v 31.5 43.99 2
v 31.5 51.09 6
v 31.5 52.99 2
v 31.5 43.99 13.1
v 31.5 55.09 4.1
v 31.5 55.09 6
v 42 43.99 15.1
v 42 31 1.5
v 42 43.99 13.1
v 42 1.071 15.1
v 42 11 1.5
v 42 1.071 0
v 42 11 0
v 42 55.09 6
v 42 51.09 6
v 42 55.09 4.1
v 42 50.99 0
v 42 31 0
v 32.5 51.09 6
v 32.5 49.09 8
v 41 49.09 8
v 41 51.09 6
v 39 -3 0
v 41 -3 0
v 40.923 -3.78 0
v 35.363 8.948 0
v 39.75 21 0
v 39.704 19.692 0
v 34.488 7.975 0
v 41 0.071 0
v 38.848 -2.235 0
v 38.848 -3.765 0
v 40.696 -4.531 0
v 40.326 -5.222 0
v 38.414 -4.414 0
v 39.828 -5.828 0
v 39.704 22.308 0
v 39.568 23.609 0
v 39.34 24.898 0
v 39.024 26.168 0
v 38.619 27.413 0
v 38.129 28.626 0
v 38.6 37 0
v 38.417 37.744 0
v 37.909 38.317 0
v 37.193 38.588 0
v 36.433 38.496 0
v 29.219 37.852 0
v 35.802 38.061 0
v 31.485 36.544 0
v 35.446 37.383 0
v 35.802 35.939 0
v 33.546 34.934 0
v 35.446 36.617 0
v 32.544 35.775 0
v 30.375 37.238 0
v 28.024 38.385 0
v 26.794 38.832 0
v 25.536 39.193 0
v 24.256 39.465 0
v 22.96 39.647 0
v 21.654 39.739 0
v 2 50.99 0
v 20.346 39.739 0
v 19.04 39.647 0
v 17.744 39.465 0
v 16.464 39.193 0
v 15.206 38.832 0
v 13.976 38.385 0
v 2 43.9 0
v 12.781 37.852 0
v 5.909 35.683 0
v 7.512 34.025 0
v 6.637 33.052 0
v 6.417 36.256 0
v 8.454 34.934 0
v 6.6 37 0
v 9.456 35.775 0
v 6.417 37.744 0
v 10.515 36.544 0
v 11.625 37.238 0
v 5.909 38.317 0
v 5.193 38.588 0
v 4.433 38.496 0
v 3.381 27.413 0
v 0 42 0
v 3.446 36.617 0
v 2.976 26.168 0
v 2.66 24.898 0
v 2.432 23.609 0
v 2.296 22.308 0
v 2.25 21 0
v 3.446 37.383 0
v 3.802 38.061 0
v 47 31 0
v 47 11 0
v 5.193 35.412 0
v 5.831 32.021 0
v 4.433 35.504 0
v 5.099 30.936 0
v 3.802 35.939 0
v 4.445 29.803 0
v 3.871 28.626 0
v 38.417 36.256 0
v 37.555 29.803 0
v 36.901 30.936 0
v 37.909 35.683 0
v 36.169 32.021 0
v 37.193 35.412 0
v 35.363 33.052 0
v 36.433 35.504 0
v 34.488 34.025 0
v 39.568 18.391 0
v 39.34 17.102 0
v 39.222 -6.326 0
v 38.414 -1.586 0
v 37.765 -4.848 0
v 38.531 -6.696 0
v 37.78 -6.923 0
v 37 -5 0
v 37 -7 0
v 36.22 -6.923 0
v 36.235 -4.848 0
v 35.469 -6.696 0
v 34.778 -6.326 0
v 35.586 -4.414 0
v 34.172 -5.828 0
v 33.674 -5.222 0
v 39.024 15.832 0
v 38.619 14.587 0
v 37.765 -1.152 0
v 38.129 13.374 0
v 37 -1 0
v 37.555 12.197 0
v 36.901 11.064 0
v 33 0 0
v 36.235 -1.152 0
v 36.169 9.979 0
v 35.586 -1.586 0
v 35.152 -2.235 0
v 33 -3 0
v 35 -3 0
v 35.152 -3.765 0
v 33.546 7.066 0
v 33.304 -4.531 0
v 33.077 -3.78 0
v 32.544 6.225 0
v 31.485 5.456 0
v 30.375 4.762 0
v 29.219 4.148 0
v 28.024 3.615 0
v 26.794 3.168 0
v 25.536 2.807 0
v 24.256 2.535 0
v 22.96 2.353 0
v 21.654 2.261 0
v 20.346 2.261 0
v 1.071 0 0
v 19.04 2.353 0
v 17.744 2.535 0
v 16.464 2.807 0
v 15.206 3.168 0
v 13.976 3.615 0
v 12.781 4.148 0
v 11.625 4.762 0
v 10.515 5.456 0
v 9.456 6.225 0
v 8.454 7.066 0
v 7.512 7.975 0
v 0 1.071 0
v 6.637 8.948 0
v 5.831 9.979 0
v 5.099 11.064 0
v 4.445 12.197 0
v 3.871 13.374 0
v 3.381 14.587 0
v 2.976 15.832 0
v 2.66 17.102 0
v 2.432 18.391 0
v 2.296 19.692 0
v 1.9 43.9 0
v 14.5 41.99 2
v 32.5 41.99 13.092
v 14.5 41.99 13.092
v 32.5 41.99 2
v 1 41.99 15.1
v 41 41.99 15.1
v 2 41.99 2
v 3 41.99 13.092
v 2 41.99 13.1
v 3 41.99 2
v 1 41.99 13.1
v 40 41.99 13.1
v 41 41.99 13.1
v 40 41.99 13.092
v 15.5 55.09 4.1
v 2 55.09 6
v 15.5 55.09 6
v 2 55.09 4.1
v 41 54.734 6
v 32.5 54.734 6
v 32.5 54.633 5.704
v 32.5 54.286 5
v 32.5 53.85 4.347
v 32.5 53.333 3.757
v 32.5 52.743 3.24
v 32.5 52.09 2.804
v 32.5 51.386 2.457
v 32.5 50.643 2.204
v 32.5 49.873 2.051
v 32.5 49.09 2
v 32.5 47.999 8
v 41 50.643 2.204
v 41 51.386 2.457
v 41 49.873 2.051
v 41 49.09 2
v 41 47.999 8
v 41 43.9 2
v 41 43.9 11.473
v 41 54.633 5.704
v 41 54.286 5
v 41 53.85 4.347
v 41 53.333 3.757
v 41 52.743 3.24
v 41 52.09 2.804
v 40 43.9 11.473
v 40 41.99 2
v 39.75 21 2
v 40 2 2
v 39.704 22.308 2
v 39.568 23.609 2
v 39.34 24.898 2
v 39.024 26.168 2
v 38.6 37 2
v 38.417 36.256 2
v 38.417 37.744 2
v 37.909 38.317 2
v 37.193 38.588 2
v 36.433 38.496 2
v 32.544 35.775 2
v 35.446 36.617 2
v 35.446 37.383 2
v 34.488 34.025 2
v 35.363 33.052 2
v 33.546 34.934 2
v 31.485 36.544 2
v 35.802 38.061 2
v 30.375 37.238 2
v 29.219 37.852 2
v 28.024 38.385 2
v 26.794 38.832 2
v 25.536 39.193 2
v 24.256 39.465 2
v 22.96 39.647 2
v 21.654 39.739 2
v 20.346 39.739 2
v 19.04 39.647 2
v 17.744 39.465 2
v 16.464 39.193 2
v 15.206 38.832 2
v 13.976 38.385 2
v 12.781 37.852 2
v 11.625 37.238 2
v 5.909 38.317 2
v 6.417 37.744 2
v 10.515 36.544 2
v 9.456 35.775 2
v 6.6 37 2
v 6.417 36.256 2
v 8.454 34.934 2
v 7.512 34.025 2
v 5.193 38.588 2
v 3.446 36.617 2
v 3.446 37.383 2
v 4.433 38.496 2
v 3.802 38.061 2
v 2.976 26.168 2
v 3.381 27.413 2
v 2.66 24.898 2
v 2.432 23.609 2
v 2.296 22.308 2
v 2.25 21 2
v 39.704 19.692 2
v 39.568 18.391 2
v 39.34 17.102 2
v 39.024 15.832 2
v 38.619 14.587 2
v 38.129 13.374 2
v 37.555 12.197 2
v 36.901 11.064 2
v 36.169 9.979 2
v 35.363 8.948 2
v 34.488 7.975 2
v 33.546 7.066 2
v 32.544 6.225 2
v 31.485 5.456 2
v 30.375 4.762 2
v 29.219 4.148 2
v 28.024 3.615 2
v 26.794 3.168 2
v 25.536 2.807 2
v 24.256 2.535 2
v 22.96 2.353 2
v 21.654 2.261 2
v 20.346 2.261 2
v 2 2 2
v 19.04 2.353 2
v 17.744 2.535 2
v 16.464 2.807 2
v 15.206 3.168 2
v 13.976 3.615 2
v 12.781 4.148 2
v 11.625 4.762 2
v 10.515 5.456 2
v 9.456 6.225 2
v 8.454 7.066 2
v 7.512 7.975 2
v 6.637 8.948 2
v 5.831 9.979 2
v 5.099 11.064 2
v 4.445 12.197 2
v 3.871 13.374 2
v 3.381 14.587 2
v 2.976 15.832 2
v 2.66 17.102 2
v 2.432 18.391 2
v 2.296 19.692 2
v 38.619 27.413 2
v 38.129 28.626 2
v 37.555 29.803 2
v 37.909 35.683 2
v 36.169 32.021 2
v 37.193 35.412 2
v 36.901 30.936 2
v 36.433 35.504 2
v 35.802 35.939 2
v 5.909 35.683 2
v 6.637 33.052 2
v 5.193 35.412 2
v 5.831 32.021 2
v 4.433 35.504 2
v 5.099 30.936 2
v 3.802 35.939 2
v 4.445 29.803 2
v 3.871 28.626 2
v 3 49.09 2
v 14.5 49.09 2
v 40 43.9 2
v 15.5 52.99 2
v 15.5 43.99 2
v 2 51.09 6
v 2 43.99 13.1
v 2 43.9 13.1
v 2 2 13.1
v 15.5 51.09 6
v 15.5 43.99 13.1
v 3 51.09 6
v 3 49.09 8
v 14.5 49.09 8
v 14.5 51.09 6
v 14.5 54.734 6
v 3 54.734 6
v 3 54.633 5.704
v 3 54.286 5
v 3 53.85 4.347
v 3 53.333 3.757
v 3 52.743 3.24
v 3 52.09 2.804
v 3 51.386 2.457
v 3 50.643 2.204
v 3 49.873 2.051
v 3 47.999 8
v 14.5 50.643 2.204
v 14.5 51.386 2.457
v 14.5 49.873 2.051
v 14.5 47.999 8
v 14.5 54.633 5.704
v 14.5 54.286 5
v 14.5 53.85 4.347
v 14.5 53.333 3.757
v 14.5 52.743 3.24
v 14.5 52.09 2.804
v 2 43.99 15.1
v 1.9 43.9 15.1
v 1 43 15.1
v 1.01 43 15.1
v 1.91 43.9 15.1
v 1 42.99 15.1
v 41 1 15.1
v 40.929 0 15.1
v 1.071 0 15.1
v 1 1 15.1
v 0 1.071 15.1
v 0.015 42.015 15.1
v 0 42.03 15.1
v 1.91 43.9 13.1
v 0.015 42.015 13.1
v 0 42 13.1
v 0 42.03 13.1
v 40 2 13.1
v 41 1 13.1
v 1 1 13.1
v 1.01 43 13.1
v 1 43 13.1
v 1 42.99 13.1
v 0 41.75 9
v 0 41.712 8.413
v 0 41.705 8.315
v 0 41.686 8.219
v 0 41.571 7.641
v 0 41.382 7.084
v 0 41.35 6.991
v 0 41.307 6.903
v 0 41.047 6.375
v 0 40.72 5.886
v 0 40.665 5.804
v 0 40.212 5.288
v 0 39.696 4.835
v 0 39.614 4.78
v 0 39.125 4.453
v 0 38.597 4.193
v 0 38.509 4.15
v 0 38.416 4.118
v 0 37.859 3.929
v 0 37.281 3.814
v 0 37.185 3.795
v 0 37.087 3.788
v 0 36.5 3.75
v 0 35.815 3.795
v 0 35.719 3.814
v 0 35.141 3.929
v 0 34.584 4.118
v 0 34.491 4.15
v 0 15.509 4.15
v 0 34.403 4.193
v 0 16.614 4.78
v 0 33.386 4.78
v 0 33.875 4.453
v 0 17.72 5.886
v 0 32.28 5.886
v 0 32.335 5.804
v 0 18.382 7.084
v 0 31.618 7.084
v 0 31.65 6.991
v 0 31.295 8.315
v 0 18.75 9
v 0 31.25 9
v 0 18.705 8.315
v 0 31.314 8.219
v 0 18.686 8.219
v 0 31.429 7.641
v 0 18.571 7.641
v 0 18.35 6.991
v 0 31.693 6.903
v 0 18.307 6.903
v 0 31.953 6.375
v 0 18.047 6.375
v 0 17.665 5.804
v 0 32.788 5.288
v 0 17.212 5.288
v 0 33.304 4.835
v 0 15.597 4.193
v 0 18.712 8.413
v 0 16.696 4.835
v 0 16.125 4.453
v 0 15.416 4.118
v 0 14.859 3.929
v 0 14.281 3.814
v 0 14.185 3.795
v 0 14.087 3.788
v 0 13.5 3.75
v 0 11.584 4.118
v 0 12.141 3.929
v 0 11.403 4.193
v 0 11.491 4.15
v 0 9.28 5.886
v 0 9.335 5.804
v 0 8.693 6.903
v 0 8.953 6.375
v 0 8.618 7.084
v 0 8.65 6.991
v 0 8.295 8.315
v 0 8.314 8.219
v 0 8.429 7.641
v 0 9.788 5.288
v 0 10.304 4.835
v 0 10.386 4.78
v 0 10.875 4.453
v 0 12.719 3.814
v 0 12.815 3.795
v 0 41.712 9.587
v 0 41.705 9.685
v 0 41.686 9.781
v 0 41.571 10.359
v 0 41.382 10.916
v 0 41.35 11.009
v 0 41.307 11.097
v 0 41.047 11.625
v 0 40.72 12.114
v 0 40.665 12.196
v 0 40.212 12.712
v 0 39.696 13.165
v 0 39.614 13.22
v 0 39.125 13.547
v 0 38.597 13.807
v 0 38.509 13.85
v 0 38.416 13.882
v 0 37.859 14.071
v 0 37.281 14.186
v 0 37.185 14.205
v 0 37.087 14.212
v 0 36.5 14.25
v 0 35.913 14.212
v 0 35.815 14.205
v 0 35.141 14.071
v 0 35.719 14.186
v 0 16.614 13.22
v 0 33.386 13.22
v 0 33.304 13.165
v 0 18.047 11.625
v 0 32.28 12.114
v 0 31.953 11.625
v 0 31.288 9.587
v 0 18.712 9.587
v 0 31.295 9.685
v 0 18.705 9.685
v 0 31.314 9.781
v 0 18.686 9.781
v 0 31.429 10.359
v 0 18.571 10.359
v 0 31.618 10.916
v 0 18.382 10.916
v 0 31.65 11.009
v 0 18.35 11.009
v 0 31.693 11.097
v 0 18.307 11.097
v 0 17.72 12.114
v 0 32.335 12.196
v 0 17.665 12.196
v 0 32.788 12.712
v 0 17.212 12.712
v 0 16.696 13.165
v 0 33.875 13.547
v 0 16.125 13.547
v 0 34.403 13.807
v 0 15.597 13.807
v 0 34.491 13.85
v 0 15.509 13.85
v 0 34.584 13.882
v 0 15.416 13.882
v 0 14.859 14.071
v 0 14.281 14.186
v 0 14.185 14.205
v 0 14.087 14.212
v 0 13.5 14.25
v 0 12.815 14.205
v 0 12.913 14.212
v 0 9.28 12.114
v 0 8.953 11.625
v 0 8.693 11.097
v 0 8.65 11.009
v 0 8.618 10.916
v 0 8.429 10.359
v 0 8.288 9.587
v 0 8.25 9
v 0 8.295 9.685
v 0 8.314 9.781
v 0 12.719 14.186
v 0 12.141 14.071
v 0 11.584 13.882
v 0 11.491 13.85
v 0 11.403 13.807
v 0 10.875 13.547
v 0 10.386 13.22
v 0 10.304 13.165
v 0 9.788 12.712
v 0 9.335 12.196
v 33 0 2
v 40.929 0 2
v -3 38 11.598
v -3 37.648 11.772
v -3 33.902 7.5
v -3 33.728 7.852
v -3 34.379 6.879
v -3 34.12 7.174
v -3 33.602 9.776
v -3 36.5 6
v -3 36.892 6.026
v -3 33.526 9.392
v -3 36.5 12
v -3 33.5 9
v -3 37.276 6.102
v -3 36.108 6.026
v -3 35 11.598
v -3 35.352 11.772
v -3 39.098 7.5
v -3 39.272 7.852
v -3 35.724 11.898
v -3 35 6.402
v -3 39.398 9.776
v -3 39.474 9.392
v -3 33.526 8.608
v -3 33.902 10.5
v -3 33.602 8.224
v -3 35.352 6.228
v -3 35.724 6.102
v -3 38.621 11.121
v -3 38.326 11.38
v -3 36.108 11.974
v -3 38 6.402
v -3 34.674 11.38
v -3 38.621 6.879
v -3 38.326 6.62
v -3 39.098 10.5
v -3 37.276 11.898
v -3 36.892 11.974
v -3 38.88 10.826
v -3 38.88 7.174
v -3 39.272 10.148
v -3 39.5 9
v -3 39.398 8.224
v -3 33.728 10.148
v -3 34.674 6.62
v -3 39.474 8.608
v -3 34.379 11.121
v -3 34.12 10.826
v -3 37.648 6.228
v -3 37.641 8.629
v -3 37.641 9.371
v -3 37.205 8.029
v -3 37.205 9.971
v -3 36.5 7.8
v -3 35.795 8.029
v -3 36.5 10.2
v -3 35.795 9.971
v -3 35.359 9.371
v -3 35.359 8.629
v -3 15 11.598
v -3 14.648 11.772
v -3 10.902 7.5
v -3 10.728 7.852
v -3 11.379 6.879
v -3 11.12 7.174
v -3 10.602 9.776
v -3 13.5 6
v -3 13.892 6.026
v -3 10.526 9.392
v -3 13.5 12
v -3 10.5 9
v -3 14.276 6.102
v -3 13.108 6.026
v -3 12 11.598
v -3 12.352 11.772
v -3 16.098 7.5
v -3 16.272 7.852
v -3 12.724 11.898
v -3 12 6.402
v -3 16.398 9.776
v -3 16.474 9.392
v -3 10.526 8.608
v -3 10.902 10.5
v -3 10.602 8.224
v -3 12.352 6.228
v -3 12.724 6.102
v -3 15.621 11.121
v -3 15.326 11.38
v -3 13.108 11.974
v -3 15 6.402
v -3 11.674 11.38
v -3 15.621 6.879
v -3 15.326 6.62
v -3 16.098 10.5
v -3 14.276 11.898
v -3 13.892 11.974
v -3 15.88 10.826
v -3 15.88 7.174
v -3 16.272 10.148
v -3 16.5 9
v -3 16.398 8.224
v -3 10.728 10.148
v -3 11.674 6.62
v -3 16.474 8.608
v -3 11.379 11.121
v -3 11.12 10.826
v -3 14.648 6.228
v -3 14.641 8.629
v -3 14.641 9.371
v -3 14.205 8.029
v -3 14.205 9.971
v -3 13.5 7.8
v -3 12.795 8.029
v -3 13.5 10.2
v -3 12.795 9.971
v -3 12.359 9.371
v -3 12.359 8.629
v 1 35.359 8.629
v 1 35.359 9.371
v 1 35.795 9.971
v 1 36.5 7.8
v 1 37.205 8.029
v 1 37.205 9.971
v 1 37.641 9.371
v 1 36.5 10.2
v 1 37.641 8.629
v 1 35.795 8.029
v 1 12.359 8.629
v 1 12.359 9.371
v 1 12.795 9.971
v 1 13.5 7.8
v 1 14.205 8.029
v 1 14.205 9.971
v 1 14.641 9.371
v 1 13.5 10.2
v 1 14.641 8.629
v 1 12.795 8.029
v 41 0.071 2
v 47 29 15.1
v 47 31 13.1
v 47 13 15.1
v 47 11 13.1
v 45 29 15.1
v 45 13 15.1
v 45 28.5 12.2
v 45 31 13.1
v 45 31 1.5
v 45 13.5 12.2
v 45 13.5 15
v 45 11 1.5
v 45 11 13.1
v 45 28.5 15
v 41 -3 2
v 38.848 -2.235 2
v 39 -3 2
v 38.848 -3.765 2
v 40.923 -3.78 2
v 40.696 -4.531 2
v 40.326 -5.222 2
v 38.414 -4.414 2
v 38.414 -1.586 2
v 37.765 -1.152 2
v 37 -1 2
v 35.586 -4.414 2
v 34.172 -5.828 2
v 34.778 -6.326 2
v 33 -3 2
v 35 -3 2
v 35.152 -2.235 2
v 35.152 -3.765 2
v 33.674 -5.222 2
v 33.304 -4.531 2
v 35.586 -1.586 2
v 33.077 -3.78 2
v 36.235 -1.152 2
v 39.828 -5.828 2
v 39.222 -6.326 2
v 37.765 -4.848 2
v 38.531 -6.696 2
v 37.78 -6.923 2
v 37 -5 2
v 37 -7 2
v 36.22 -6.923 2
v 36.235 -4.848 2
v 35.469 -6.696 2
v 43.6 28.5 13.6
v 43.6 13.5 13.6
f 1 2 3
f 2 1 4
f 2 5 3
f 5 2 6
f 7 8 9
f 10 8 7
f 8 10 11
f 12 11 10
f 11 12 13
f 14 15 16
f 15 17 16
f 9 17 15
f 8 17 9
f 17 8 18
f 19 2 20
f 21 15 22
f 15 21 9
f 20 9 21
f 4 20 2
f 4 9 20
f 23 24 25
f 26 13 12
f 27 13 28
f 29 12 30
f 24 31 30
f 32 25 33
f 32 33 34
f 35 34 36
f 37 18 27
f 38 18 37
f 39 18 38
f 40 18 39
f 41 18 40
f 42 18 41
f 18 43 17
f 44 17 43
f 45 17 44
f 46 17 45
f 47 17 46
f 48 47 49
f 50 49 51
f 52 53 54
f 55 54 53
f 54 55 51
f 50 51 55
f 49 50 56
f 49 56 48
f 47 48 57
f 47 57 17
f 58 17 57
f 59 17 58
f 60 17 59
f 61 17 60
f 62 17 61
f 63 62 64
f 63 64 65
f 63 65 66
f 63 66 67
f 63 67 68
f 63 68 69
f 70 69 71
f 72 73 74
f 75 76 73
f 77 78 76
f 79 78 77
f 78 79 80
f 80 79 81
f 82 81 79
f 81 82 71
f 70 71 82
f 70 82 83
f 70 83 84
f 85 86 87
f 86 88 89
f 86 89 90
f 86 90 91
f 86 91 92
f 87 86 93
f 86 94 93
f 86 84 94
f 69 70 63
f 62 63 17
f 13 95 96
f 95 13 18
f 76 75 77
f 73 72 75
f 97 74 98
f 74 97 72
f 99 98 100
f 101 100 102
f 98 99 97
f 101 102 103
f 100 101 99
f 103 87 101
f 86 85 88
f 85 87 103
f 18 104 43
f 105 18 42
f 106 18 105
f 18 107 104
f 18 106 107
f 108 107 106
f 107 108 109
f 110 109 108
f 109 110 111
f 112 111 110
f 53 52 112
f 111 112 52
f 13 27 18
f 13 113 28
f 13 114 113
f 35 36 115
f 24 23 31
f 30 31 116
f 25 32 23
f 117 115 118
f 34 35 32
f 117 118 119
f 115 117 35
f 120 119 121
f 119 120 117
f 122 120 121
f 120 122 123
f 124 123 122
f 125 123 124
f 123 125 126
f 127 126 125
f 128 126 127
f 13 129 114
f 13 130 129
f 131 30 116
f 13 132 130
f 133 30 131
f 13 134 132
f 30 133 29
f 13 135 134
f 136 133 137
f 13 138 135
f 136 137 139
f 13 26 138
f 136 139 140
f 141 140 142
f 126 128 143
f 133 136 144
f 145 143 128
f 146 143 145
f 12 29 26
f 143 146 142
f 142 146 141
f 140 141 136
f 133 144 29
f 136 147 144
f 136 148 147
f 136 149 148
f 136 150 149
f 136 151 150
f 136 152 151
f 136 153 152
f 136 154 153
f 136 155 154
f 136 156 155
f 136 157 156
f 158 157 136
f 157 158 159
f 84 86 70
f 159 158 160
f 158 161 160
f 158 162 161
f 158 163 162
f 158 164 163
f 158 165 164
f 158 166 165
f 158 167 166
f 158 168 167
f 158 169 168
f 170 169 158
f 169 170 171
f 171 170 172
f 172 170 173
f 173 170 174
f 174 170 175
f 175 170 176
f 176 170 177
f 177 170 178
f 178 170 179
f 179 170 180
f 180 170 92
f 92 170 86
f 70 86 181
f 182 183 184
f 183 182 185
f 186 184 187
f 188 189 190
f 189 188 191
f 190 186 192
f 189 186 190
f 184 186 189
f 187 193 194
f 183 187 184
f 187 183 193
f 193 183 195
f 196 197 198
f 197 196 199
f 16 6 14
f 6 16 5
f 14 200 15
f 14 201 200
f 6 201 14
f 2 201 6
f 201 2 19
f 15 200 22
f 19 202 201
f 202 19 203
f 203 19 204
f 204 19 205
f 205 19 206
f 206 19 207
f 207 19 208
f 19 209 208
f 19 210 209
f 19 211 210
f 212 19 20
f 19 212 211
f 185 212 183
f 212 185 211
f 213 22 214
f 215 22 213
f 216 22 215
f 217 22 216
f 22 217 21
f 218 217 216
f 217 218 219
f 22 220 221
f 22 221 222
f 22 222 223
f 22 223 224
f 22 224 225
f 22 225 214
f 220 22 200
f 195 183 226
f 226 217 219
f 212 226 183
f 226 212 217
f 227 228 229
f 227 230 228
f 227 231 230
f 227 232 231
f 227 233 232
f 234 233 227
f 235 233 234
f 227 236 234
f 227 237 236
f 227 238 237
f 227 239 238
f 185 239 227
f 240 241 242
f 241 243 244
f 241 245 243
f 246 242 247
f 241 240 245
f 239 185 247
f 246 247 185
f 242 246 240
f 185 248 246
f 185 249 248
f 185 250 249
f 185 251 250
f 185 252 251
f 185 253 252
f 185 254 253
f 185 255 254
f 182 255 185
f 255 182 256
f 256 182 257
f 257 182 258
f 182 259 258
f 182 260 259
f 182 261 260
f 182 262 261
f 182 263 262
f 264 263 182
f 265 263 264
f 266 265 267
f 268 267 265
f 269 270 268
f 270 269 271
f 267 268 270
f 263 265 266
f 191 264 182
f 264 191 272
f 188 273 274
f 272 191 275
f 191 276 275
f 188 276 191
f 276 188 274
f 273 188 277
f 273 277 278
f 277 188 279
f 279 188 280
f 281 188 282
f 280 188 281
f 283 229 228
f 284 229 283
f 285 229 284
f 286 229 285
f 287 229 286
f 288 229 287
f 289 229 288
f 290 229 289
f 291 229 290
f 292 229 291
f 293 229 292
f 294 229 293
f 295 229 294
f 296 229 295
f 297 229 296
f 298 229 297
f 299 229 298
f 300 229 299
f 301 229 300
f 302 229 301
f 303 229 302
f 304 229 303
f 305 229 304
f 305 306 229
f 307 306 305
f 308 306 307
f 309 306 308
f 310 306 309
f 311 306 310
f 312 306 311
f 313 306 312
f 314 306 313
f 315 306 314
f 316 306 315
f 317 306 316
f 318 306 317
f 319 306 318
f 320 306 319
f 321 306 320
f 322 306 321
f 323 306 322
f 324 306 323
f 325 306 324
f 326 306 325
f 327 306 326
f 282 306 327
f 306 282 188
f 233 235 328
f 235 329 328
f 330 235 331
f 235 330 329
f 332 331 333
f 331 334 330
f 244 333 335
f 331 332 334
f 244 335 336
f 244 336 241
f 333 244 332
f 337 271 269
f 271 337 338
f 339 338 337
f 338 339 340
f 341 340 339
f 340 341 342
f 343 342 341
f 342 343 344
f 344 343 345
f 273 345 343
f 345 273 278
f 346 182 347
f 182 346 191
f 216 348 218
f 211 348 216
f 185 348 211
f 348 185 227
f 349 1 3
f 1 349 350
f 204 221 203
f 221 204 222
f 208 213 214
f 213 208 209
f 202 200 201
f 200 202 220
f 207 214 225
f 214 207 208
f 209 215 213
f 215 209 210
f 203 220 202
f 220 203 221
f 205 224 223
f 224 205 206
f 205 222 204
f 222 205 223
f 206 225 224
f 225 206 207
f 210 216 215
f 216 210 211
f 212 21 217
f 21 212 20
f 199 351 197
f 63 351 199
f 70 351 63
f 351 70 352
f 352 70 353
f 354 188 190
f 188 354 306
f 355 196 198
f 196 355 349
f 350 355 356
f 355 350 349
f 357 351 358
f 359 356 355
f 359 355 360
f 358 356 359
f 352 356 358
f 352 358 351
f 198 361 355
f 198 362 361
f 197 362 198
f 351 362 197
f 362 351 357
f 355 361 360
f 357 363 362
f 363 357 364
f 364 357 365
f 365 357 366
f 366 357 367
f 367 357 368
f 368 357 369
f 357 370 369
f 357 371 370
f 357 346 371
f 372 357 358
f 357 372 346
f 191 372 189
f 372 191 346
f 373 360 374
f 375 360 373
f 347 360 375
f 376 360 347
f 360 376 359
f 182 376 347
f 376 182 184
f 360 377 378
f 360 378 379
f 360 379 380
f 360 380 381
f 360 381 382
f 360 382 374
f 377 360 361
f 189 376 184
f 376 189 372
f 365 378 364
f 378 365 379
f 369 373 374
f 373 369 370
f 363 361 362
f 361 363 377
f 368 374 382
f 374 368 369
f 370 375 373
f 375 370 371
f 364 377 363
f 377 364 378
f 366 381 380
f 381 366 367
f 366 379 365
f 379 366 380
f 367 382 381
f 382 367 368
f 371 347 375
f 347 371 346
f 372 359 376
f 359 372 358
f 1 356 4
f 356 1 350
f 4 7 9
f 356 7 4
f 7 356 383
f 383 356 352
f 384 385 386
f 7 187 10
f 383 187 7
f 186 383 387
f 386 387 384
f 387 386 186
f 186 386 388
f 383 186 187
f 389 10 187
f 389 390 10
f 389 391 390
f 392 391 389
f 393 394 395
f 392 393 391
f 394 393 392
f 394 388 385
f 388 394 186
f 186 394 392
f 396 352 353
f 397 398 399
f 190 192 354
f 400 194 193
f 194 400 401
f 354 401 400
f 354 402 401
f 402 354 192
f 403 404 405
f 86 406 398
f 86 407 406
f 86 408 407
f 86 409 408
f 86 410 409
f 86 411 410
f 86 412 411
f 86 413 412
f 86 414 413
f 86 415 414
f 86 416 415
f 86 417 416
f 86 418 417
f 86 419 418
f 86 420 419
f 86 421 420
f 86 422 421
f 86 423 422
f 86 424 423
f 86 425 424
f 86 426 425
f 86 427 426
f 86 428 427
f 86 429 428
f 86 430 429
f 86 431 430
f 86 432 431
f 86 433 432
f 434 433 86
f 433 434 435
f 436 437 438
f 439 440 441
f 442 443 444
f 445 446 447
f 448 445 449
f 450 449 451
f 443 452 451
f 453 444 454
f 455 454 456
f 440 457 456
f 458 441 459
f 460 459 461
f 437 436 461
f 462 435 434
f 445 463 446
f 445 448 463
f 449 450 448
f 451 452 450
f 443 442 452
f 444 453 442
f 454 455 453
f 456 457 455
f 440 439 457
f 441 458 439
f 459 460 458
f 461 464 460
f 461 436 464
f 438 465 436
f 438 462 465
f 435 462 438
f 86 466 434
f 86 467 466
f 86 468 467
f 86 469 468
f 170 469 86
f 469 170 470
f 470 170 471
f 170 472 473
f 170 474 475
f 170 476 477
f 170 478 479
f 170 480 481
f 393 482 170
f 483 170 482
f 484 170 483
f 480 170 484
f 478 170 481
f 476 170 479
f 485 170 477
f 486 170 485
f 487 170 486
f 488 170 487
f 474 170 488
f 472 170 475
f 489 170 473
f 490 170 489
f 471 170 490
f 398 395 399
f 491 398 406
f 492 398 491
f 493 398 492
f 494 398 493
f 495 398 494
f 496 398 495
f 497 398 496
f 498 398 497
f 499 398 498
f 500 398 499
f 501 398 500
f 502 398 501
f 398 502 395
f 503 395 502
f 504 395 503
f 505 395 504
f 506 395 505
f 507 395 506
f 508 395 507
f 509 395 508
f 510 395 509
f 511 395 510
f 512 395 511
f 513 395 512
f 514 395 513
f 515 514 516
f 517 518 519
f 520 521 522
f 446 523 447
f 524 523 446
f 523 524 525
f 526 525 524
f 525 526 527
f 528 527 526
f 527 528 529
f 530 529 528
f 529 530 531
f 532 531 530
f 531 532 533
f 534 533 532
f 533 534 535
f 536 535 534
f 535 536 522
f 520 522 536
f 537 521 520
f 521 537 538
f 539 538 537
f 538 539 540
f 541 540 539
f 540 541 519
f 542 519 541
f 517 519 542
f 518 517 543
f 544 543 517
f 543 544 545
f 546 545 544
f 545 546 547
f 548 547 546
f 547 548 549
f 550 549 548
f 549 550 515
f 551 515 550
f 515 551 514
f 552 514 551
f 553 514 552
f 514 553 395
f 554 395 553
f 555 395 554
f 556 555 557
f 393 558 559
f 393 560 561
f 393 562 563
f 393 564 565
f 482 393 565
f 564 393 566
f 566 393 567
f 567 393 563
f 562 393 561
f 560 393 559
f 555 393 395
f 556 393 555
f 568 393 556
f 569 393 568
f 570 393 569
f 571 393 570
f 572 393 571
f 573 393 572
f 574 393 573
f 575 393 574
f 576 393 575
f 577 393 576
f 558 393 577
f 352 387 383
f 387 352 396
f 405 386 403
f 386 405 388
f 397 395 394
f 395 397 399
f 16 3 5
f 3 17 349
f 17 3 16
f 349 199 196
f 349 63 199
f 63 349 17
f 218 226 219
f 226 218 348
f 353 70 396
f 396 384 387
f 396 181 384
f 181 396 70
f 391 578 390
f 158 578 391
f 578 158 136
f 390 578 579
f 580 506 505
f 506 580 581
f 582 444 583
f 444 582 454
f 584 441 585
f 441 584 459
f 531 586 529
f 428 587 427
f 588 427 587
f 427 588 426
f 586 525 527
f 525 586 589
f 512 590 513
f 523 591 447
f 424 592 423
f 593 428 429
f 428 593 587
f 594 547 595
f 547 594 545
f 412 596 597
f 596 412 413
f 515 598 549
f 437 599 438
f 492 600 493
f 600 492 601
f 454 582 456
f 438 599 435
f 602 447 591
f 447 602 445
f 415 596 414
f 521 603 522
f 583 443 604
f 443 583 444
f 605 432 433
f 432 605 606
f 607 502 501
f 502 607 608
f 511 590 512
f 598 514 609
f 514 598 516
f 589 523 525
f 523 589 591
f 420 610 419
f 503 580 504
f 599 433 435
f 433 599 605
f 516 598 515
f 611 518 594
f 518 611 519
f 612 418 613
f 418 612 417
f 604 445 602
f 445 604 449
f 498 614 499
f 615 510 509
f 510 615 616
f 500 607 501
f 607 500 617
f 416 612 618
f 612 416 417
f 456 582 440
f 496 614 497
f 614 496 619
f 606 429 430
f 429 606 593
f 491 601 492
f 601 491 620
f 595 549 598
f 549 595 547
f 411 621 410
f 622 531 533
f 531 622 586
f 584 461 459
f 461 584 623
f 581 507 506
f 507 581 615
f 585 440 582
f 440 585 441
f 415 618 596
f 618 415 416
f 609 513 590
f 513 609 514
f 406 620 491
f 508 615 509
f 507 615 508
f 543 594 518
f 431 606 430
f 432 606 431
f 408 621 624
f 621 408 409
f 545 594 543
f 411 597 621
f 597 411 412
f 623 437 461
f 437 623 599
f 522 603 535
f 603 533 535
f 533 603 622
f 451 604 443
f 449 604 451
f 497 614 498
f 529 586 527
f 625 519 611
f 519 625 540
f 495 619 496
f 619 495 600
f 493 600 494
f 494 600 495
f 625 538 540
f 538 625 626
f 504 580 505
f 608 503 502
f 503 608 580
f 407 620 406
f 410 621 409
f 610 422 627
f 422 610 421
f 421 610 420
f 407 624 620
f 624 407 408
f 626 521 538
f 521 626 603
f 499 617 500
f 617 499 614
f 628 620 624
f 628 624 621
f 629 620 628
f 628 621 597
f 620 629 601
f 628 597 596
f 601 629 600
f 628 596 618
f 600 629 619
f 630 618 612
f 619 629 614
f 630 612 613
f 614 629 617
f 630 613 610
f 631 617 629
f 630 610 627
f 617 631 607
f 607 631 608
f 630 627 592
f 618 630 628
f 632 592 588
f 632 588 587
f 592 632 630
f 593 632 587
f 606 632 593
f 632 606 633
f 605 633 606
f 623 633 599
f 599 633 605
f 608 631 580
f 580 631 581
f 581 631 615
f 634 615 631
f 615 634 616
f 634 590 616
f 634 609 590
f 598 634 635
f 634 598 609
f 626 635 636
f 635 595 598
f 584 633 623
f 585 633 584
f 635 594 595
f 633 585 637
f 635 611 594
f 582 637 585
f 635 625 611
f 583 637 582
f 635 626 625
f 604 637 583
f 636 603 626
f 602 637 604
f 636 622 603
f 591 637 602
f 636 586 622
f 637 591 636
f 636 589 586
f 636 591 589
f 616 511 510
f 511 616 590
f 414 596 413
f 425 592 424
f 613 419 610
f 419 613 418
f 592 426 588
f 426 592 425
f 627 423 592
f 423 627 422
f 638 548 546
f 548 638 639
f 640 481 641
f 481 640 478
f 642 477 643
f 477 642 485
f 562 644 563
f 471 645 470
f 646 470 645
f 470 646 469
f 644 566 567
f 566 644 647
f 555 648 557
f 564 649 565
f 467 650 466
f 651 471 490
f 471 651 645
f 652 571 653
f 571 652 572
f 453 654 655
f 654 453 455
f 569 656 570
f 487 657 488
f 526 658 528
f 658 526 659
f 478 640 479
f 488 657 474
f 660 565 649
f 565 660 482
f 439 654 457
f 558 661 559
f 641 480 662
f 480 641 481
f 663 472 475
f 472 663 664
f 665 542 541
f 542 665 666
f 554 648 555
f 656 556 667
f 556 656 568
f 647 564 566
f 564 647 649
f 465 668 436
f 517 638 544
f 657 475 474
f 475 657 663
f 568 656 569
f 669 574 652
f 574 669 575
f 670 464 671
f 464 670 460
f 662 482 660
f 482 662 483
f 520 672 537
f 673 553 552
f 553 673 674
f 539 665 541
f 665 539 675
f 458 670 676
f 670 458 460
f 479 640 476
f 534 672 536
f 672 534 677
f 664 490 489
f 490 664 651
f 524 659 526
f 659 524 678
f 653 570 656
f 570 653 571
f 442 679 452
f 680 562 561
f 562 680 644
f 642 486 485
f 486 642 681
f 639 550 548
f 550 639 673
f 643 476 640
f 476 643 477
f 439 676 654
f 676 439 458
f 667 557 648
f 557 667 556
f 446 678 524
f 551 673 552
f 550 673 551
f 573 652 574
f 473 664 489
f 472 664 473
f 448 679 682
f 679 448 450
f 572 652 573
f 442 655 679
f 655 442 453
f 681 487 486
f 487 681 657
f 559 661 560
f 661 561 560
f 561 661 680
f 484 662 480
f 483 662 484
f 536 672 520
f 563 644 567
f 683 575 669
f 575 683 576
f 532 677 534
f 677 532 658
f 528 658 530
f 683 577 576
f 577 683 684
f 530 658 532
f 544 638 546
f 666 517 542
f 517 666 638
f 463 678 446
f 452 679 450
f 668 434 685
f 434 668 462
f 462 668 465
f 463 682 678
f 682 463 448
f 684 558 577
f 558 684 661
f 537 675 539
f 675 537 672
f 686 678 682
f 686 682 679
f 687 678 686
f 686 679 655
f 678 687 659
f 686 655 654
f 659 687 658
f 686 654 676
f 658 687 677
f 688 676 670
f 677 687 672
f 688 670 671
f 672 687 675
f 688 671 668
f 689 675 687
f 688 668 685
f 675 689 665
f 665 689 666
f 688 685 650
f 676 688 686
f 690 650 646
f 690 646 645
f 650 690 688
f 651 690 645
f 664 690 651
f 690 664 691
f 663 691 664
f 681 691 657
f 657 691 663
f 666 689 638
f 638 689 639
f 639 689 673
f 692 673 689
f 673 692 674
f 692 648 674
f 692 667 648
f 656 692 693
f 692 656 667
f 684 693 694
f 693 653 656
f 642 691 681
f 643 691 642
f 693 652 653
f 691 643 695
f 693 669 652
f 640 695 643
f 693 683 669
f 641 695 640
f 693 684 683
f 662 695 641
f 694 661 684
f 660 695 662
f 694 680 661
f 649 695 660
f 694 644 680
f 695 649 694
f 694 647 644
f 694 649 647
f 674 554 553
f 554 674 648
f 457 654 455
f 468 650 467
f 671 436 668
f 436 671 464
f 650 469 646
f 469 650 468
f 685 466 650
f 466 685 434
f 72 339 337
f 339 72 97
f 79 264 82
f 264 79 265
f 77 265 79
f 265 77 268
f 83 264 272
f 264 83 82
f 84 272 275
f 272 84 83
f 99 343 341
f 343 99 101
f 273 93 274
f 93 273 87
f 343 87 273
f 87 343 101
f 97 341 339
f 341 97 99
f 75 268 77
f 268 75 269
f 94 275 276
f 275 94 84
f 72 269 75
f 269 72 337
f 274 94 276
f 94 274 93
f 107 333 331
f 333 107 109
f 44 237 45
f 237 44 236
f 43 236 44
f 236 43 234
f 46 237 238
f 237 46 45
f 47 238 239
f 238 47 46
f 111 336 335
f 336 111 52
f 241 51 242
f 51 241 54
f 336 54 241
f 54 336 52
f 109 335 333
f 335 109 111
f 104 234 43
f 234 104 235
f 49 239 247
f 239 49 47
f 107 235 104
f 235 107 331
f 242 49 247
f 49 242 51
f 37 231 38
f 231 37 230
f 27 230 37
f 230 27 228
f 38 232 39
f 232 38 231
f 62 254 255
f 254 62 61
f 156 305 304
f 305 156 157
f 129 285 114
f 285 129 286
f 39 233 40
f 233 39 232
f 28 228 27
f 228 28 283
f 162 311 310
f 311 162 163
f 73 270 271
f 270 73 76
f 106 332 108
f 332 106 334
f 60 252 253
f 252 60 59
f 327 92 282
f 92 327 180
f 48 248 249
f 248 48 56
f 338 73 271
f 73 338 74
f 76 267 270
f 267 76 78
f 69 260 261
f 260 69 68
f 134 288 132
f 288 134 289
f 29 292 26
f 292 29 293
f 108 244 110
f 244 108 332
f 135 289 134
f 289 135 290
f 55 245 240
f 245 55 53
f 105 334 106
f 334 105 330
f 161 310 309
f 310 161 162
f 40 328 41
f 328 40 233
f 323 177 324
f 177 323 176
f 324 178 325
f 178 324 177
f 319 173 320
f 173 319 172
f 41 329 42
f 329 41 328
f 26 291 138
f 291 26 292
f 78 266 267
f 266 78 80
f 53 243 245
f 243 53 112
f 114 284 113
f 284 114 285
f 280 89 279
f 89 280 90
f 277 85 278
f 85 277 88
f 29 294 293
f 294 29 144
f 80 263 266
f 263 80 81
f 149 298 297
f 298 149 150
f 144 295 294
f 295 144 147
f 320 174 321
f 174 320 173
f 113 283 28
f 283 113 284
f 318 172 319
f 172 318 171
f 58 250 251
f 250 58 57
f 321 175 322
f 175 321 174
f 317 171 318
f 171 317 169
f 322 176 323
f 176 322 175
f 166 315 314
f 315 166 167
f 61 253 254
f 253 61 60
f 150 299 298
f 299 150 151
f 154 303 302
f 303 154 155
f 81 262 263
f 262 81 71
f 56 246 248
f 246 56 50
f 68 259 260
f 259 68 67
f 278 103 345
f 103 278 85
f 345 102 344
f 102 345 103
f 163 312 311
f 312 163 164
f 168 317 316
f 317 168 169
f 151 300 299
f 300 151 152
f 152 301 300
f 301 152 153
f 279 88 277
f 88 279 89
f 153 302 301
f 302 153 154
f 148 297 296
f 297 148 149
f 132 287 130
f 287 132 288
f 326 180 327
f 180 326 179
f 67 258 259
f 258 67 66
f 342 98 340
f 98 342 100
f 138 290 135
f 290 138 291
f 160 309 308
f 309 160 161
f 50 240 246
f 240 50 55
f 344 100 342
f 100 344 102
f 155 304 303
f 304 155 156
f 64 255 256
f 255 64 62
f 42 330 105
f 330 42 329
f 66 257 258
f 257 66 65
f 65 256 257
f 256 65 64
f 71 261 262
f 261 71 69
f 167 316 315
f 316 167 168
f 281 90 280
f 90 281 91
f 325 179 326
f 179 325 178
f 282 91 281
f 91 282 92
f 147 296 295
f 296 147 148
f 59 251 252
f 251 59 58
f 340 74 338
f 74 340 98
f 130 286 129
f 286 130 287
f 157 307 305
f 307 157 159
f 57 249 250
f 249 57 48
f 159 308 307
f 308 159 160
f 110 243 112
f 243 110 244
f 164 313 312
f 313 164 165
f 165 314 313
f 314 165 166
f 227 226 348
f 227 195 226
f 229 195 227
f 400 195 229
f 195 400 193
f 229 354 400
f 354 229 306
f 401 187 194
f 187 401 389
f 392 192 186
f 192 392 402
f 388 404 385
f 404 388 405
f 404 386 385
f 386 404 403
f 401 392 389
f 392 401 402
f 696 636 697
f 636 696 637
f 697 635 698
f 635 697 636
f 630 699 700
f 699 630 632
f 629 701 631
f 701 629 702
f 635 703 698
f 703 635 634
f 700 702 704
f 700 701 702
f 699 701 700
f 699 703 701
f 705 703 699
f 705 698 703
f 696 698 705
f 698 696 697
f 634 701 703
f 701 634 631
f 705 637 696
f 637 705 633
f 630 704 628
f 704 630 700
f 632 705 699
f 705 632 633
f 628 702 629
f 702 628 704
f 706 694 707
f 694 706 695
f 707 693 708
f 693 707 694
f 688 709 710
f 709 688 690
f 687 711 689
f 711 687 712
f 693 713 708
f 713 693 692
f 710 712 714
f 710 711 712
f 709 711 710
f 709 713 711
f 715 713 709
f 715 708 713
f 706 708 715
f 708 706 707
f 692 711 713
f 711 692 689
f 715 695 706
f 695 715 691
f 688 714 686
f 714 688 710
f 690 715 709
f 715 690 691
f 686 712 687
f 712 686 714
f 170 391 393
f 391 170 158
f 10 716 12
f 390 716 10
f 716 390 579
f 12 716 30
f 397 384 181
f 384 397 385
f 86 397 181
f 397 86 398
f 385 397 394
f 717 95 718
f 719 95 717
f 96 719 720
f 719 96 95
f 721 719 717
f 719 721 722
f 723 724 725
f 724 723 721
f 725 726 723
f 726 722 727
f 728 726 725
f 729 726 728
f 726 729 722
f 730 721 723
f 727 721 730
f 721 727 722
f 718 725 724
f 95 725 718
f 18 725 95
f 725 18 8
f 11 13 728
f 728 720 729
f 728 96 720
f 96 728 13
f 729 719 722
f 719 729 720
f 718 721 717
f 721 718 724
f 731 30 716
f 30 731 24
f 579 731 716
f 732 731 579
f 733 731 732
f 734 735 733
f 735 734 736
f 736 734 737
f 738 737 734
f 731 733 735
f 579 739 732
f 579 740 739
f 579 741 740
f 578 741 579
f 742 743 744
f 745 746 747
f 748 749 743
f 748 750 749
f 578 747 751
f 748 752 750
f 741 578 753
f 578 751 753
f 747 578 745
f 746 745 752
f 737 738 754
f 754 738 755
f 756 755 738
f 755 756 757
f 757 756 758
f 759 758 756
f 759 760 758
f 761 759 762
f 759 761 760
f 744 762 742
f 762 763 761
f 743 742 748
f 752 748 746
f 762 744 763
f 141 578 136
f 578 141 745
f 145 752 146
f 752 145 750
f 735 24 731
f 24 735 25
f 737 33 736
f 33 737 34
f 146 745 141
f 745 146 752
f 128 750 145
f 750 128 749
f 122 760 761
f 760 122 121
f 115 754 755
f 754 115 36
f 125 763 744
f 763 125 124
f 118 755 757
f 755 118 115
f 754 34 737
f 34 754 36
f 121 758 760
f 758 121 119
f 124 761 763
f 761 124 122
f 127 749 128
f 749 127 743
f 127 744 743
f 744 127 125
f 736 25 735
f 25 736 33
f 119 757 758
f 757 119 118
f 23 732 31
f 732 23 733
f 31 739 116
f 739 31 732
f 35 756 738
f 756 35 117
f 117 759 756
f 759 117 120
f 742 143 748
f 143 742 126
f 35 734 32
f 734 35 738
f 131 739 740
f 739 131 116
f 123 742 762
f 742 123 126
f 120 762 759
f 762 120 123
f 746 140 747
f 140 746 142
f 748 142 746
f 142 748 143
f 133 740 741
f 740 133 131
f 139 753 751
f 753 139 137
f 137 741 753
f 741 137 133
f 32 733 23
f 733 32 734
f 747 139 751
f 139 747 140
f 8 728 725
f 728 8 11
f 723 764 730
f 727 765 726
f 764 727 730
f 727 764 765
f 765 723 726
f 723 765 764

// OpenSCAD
// Original design by Matt (iamburny)
// Changes by dc42:
// 1. Increased thickness of cable trap from 1.5mm to 2mm because mine broke
// 2. Replaced tie wrap T at top centre by tie wrap hole at top right

$fs=0.8; // def 1, 0.2 is high res
$fa=4;//def 12, 3 is very nice
%translate([0,0,-0.5])cube([200,200,1],center=true); //build platform

sc = 32; //Screw Centres
wall=2;
hole = 37.5;  //fan hole
x=42;
y=x;
z=15.10;
heo = 2.5; //hot end offset
hbr = 16; //heat block recess

size=11; // size of the ball joint
joint_spacing =0; // some space between them?
joint_thickness = 3; // thickness of the arms - was 2
joint_arms = 2; // how many arms do you want?
arm_width = 5; // actually: how much is removed from the arms Larger values will remove more - was 10

ventB=(x/2)-(hbr/2)+heo-2;
ventS=(x/2)-(hbr/2)-heo;

module ball() {
	sphere(r=size);
	translate([0,0,-size]) cylinder(r1=8,r2=6,h=3);
	translate([0,0,-size-3]) cylinder(r=8,h=3);
}

module joint() {
	difference() 	{
		sphere(r=size+joint_spacing+joint_thickness);
		sphere(r=size+joint_spacing);
		translate([0,0,-size-3]) cube([size+joint_spacing+joint_thickness+25,size+joint_spacing+joint_thickness+25,18],center=true);
		for(i=[0:joint_arms])
		{
			rotate([0,0,360/joint_arms*i]) translate([-arm_width/2,0, -size/2-4])
				cube([arm_width,size+joint_spacing+joint_thickness+20,size+6]);
		}
	}
	translate([0,0,size-0]) cylinder(r2=12,r1=12,h=5);

}

module prism(l, w, h) {
	translate([0, l, 0]) rotate( a= [90, 0, 0]) 
	linear_extrude(height = l) polygon(points = [
		[0, 0],
		[w, 0],
		[0, h]
	], paths=[[0,2,1]]);
}

module vHole(len) {
	difference() {
		union() {
			cube([10-6,len,6]);
			translate([10-6,len,6]) rotate([90,0,0]) cylinder(len,6,6);
		}
		translate ([-7,-1,6]) cube([16,len+2,10]);
		translate ([-7,-1,0]) cube([6,len+2,7]);
	}
}

//Vents
translate([x,y-0.01,0]) rotate([0,0,90]) {
	difference() {
		union() {
			difference() { //Small Vent
				union() {
					prism(ventS,z,z);
					translate([z-6,0,0]) cube([4,ventS,6]); //tip
				}
				difference() {
					translate([-.01,wall/2,wall]) prism(ventS-wall,z-wall, z-wall*2);
					translate([6,0,0]) cube([6,ventS,6]);
				}
				translate([z-12,wall-1,wall]) vHole(ventS-(wall));
			}

			translate([0,ventS+hbr,0]) { 
				difference() { //Big Vent
					union() {
						prism(ventB,z,z);
						translate([z-6,0,0]) cube([4,ventB,6]);
					}
					difference() {
						translate([-.01,wall/2,wall]) prism(ventB-wall,z-wall,z-wall*2);
						translate([6,0,0]) cube([6,ventB,6]);
					}
					translate([z-12,wall-1,wall]) vHole(ventB-(wall));
				}
			}
			
			cube([z-2,y-2,wall]); //vent Base
			translate([0,ventS,wall]) cube([wall,hbr,z-(wall*2)]); //vent join			
			
			difference() {
				translate([0,0,z-wall]) cube([wall,y,wall]); //top of slope edging strip
				translate([2,y-2,-1]) rotate([0,0,45]) cube([2.8,2.8,z+2]); //bottom right bevel
			}
		}
		translate([9,-1,0]) rotate([0,45,0]) cube([10,y+2,10]); //vent bottom bevel
	}
}

//Body
difference() {
	union() {
		cube([x,y+1.9,z]); //outer block
	translate([-3,((x-sc)/2) + sc - 0.5,9]) rotate([0,90,0]) cylinder(4,3,6);	// sensor board mount
	translate([-3,((x-sc)/2) + sc - 23.5,9]) rotate([0,90,0]) cylinder(4,3,6);	// sensor board mount	

	}
	translate([x/2,x/2,-.1]) cylinder(20,hole/2,hole/2); //fan hole
	
	translate([wall,wall,2]) cube([x-(wall*2), x, 20]); //heatsink hole
	translate([wall-1,wall-1,z-2]) cube([x-(wall), x, 20]); //heatsink recess
	for(xp = [0:1]) { //2 x screw holes
		translate([((x-sc)/2) + (xp*sc),((x-sc)/2) + sc,-.1]) cylinder(3,1.6,1.6);
	}
	
	translate([-4,((x-sc)/2) + sc - 0.5,9]) rotate([0,90,0]) cylinder(h=5,r=1.2);	// sensor board hole
	translate([-4,((x-sc)/2) + sc - 23.5,9]) rotate([0,90,0]) cylinder(h=5,r=1.2);	// sensor board hole
	
	translate([0,-6,-1]) rotate([0,0,45]) cube([5,5,z+2]); // top bevel
	translate([x,-6,-1]) rotate([0,0,45]) cube([5,5,z+2]); //top bevel
	translate([0,y,-1]) rotate([0,0,45]) cube([2.7,2.7,z+2]); //bottom right bevel
}

//Cable Traps
translate([x,(y/2)-10,0]) cube([wall*2,20,1.5]); //right cable trap
difference() {
	translate([x+3,(y/2)-10,0]) cube([2,20,z]); //right cable trap
	translate([x+2,(y/2)-10,z-2]) rotate([45,0,0]) cube(3); //right cable trap bevel
	translate([x+2,y-11,z-2]) rotate([45,0,0]) cube(3); //right cable trap bevel
}
translate([x+1.6,(y/2)-7.5,z-1.5]) rotate([0,45,0]) cube([2,15,2]); //right cable trap catch


//Tie Wrap hole
difference() {
	union() {
		translate([x-9,-3,0]) cube([8,4,2]);
		translate([x-5,-3,0]) cylinder(r=4,h=2);
	}
	translate([x-5,-3,-1]) cylinder(r=2,h=4);
}

/*Ball Joint
difference() {
	union() {
		rotate([0,90,0]) scale(.5)  translate([-size+1,size,97]) ball();
		//translate([20,20,2.4]) scale(.5) joint();
	}
	translate([0,0,-6]) cube([100,100,6]);
	translate([20,20,2.4]) cylinder(20,1.5,1.5);
}
*/
